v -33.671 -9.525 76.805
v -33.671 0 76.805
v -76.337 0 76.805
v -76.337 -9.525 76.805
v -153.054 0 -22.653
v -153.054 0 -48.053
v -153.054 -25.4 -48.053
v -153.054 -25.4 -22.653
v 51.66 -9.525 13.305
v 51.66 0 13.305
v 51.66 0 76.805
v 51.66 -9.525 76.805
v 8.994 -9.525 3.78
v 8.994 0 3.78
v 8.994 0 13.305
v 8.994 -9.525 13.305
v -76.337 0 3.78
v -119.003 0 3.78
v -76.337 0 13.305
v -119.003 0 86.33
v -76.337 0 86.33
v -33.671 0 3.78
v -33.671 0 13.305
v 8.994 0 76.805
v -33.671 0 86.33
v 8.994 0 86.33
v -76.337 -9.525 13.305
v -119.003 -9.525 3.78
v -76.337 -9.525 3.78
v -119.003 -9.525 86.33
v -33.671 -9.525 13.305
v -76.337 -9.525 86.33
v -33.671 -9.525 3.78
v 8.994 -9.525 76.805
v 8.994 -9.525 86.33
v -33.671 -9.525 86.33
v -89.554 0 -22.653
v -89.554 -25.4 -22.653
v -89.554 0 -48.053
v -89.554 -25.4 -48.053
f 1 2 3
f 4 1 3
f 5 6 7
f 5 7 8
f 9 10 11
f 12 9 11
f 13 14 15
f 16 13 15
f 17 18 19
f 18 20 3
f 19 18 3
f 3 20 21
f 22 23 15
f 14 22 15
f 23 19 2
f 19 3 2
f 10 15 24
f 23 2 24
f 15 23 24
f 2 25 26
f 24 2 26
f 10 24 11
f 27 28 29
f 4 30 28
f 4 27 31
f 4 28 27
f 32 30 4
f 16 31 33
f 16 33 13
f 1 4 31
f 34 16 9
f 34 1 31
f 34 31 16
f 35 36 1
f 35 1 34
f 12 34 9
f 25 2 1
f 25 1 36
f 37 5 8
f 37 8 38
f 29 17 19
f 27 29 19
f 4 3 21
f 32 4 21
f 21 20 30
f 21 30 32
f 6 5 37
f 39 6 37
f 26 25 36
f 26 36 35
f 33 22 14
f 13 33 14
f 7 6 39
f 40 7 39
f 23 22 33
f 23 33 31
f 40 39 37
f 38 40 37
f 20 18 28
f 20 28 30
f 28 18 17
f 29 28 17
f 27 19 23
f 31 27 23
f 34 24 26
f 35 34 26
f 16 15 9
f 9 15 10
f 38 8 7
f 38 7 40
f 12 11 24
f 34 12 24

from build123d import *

# Parameters (mm, degrees)
F1_DEPTH = 9.525
F0_W     = 42.66565
F0_H     = 9.525
F2_DEPTH = 9.525
F3_W     = 63.5
F3_H     = 25.4
F4_DEPTH = 25.4


with BuildPart() as f1:
    # F0 (on Front) → F1 (new body)
    with BuildSketch(Plane.XZ):
        Polygon((-76.3369487221, 76.8050001446), (-119.0025987221, 76.8050001446), (-119.0025987221, 13.3050001446), (-76.3369487221, 13.3050001446), (-33.6712987221, 13.3050001446), (8.9943512779, 13.3050001446), (51.6600012779, 13.3050001446), (51.6600012779, 76.8050001446), (8.9943512779, 76.8050001446), (-33.6712987221, 76.8050001446), align=None)
    extrude(amount=F1_DEPTH)

    # F0 (on Front) → F2 (join)
    with BuildSketch(Plane.XZ):
        with Locations((-97.6697737221, 8.5425001446)):
            Rectangle(F0_W, F0_H)
        with Locations((-12.3384737221, 8.5425001446)):
            Rectangle(F0_W, F0_H)
        with Locations((-97.6697737221, 81.5675001446)):
            Rectangle(F0_W, F0_H)
        with Locations((-12.3384737221, 81.5675001446)):
            Rectangle(F0_W, F0_H)
    extrude(amount=F2_DEPTH)


with BuildPart() as f4:
    # F3 (on Front) → F4 (new body)
    with BuildSketch(Plane.XZ):
        with Locations((-121.3036839962, -35.3525307357)):
            Rectangle(F3_W, F3_H)
    extrude(amount=F4_DEPTH)


solid = Compound([f1.part, f4.part])
